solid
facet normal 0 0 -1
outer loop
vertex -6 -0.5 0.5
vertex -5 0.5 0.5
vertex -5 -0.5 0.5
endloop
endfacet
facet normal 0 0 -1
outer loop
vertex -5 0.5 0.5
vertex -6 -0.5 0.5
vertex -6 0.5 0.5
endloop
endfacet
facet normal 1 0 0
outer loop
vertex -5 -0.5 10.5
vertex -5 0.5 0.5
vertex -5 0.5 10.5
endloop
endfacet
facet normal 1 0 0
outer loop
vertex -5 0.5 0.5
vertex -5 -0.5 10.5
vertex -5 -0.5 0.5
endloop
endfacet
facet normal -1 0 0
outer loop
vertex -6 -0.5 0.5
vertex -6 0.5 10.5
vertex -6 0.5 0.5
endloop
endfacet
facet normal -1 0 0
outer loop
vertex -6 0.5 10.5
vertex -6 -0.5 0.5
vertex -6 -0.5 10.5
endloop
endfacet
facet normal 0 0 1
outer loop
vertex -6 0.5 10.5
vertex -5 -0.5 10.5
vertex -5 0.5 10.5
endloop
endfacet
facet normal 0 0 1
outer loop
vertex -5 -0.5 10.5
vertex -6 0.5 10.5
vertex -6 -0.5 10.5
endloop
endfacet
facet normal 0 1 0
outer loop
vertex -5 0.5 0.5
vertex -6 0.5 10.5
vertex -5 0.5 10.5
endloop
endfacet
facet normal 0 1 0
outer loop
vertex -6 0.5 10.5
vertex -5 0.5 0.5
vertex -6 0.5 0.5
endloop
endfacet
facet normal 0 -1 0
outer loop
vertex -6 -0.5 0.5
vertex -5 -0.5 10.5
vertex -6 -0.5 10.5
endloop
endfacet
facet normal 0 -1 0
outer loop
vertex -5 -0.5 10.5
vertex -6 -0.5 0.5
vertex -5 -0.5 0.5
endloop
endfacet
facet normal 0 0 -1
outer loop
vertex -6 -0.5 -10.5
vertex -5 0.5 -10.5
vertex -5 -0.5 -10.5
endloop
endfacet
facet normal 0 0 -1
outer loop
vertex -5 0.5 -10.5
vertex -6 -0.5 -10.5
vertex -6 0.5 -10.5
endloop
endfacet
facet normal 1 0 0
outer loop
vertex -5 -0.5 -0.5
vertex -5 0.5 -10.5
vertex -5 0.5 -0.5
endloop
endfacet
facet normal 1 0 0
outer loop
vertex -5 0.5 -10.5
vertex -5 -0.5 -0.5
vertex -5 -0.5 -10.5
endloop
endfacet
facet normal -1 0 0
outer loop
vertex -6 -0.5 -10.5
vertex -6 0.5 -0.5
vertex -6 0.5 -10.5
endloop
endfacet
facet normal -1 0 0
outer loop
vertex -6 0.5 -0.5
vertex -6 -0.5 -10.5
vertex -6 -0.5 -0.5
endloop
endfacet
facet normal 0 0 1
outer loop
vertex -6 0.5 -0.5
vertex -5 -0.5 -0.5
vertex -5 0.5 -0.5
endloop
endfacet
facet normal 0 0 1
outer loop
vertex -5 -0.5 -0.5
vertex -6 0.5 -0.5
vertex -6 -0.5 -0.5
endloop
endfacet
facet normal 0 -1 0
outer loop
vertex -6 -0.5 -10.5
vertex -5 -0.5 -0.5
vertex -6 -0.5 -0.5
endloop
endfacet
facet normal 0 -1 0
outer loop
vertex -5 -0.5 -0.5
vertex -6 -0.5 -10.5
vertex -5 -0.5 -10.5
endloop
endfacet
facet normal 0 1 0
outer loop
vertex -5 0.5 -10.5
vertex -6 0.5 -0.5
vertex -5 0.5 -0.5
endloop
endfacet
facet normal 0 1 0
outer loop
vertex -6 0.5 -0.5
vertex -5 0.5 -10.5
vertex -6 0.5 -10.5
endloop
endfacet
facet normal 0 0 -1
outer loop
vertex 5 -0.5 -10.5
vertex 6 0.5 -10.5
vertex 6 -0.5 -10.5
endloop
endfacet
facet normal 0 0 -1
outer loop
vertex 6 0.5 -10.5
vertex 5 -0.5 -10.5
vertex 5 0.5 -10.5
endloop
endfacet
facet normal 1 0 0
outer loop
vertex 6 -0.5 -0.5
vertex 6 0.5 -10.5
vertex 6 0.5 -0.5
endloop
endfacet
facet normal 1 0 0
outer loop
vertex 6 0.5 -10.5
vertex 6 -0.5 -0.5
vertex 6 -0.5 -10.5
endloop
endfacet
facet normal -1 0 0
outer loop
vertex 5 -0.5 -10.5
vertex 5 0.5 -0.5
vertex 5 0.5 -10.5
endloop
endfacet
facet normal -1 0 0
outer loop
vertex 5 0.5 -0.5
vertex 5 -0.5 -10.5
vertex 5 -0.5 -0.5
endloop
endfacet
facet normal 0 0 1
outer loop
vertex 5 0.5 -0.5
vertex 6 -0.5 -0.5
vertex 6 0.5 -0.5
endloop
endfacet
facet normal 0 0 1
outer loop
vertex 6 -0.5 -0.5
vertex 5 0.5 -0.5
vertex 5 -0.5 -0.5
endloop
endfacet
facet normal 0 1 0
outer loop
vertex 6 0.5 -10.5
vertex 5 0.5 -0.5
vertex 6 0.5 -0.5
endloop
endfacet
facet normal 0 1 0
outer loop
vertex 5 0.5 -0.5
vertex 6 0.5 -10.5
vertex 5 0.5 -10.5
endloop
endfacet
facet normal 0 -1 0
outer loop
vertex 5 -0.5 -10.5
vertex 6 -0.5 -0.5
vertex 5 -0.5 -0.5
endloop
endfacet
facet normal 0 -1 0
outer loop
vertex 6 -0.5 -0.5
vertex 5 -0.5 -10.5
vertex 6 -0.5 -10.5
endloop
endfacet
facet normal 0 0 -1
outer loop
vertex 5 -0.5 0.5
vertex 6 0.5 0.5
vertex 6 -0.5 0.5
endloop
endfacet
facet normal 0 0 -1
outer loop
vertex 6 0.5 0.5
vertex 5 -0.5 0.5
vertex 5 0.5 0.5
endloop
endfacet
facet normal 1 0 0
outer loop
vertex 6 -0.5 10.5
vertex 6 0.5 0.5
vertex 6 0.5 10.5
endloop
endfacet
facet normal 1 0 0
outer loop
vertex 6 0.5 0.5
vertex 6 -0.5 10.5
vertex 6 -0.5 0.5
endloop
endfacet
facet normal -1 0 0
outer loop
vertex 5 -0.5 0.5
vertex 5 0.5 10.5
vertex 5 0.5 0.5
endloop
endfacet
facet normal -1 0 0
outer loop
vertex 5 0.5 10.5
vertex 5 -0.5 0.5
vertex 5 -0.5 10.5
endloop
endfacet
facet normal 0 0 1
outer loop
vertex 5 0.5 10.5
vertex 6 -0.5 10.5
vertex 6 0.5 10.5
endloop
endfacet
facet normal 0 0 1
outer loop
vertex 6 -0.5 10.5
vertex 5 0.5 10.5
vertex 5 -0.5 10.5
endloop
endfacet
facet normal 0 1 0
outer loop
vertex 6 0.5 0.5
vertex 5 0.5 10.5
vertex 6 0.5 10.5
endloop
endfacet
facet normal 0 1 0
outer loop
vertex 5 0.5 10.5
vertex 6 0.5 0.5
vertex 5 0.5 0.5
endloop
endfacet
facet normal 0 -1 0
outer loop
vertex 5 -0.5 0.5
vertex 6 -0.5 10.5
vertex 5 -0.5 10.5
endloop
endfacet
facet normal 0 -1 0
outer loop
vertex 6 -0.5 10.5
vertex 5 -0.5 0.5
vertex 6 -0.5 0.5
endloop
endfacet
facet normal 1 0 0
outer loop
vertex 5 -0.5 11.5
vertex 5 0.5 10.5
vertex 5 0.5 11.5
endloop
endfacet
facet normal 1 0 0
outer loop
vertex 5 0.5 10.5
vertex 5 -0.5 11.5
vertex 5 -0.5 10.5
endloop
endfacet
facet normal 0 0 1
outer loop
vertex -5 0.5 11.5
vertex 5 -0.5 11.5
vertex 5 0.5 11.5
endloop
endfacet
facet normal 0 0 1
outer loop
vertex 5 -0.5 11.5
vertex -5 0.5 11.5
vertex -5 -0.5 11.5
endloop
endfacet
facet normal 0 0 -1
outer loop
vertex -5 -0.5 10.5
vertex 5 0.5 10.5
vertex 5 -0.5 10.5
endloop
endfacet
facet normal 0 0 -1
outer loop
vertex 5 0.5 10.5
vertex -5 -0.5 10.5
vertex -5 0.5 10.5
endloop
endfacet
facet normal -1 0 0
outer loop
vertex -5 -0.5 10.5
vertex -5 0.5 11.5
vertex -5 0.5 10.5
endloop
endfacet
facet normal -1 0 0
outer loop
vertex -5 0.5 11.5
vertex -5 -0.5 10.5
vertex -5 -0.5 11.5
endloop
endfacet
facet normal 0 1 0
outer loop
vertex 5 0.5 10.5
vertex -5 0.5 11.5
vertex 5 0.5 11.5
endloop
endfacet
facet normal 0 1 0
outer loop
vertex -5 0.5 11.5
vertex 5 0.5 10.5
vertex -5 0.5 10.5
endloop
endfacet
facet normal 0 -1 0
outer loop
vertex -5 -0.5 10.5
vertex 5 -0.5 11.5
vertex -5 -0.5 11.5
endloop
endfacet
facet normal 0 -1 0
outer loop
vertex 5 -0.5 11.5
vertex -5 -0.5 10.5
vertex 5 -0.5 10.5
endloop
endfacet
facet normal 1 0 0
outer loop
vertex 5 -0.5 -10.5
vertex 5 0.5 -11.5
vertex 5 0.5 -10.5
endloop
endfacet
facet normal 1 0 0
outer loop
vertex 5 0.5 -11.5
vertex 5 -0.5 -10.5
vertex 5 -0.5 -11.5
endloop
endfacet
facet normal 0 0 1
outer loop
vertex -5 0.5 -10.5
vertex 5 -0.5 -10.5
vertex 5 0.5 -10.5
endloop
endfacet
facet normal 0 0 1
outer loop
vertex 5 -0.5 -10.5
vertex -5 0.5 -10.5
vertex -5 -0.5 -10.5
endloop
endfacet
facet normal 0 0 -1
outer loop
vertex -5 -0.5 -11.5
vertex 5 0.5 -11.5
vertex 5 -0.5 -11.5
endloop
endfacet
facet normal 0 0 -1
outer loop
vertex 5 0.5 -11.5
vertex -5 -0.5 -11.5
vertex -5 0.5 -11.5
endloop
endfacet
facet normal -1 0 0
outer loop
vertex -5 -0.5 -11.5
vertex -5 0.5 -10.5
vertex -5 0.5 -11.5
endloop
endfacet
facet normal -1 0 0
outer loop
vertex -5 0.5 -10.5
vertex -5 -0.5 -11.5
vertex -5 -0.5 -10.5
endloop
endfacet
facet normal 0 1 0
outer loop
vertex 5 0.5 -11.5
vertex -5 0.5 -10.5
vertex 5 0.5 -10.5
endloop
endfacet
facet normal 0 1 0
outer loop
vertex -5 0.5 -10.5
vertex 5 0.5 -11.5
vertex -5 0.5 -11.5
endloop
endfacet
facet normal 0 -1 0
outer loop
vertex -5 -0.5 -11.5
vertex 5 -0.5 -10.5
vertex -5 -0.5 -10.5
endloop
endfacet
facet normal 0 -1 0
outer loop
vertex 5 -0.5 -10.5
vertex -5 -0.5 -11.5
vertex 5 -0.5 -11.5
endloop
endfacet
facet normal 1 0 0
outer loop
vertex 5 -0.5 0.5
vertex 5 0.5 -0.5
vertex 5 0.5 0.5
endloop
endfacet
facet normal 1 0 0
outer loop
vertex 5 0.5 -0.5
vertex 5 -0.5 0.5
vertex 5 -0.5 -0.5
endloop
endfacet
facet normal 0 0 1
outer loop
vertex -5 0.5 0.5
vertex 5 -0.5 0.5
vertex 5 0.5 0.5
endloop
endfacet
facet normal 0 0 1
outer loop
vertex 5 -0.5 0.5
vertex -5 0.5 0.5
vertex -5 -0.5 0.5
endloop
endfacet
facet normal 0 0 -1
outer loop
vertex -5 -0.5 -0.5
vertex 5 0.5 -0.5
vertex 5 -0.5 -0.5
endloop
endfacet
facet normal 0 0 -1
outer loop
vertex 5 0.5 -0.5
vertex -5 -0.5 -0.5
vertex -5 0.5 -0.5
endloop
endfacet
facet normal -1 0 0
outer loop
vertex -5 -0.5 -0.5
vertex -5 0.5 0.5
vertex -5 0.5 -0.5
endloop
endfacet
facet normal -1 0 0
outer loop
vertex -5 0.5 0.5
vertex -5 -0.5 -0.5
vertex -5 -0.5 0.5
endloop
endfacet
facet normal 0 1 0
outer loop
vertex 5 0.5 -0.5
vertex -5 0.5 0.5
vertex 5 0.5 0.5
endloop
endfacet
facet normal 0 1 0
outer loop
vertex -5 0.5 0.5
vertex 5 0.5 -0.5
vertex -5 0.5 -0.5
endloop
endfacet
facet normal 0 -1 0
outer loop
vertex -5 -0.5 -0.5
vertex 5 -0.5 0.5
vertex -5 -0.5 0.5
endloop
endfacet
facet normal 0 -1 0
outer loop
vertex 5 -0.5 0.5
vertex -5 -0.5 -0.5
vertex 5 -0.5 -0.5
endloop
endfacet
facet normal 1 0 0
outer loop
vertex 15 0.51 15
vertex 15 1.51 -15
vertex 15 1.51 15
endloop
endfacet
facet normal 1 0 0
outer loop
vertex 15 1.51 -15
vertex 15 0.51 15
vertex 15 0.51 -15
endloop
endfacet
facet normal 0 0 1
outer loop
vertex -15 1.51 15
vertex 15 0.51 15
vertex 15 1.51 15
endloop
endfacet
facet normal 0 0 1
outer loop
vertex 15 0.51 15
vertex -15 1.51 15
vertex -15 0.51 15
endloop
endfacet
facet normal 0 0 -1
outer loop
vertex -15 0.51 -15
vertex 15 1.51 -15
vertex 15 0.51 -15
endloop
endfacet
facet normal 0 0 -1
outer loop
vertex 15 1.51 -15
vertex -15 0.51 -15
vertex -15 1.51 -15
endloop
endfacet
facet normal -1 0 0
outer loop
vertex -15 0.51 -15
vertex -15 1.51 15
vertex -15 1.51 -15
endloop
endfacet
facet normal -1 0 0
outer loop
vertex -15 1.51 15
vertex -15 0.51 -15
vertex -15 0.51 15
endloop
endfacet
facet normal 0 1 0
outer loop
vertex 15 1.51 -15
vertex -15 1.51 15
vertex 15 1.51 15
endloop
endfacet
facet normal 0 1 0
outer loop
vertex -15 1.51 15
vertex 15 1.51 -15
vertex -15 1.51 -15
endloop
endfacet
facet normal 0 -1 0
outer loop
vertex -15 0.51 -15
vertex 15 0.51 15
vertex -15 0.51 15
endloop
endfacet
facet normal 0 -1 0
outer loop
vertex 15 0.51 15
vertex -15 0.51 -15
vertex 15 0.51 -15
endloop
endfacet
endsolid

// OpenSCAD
module Color_num(color_data){
    //Color = [Main Body, Pocket] 
    echo(color_data);
    echo(color_data[1]);
    
    translate([-5.5,0,5.5])
    color(color_data[0])
    rotate([0,90,0])
    cube([10,1,1], center = true);

 
  color(color_data[1])
    translate([-5.5,0,-5.5])
    color("red")
    rotate([0,90,0])
    cube([10,1,1], center = true);
    
    color(color_data[2])
    translate([5.5,0,-5.5])
    color("red")
    rotate([0,90,0])
    cube([10,1,1], center = true);

    color(color_data[3])
    translate([5.5,0,5.5])
    color("red")
    rotate([0,90,0])
    cube([10,1,1], center = true);

    color(color_data[4])
    translate([0,0,11])
    color("red")
    cube([10,1,1], center = true);
  
    color(color_data[5])
    translate([0,0,-11])
    color("red")
    cube([10,1,1], center = true);
    
    color(color_data[6]) 
    rotate([0,-0,0])
    cube([10,1,1], center = true);     
     
}

S1="Black";
S2="Red";

color("Black") 
translate([0,1.01,0])
cube([30,1,30], center = true);

N_Four = [S2,S1,S2,S2,S1,S1,S2];
N_Five = [S2,S1,S2,S1,S2,S2,S2];
N_Six = [S2,S2,S2,S1,S2,S2,S2];

Color_num(N_Six);
